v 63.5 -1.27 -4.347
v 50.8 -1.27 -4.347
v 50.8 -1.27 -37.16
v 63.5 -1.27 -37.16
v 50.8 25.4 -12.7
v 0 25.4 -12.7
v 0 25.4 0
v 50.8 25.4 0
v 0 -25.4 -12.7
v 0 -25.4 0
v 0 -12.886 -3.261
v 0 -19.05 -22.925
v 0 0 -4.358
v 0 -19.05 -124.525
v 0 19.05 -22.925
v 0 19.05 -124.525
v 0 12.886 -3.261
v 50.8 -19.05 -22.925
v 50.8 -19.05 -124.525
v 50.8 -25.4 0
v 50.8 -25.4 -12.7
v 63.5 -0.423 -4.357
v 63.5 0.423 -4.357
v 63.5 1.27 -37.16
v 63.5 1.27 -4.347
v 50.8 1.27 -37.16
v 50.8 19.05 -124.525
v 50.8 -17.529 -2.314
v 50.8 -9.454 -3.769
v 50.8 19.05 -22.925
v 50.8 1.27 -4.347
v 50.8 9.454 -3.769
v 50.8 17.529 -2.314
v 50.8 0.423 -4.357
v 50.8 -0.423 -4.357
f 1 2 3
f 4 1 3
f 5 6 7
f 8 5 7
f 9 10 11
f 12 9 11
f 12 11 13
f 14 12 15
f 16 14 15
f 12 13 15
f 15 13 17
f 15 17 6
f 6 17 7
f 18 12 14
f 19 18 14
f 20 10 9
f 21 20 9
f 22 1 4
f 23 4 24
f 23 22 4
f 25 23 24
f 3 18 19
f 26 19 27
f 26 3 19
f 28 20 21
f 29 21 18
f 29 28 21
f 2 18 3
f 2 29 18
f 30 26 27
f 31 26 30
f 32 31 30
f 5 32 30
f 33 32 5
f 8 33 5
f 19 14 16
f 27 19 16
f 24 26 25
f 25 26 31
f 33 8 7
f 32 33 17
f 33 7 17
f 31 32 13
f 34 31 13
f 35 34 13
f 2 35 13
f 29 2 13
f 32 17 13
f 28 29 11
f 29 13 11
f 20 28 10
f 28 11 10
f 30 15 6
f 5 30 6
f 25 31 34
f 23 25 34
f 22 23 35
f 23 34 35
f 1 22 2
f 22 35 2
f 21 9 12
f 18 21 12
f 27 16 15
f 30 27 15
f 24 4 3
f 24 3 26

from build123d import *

# Parameters (mm, degrees)
F1_DEPTH = 50.8
F3_DEPTH = 12.7


with BuildPart() as f1:
    # F0 (on Right) → F1 (new body)
    with BuildSketch(Plane.YZ):
        with BuildLine():
            ThreePointArc((25.4, 0), (0, -4.357951), (-25.4, 0))
            Line((-25.4, 0), (-25.4, -12.7))
            Line((-25.4, -12.7), (-19.05, -22.925066))
            Line((-19.05, -22.925066), (-19.05, -124.525066))
            Line((-19.05, -124.525066), (19.05, -124.525066))
            Line((19.05, -124.525066), (19.05, -22.925066))
            Line((19.05, -22.925066), (25.4, -12.7))
            Line((25.4, -12.7), (25.4, 0))
        make_face()
    extrude(amount=F1_DEPTH)

    # F2 (on face) → F3 (join)
    with BuildSketch(Plane.YZ.offset(50.8)):
        with BuildLine():
            ThreePointArc((1.27, -4.347367), (0, -4.357951), (-1.27, -4.347367))
            Line((-1.27, -4.347367), (-1.27, -37.160147))
            Line((-1.27, -37.160147), (1.27, -37.160147))
            Line((1.27, -37.160147), (1.27, -4.347367))
        make_face()
    extrude(amount=F3_DEPTH)


solid = f1.part
